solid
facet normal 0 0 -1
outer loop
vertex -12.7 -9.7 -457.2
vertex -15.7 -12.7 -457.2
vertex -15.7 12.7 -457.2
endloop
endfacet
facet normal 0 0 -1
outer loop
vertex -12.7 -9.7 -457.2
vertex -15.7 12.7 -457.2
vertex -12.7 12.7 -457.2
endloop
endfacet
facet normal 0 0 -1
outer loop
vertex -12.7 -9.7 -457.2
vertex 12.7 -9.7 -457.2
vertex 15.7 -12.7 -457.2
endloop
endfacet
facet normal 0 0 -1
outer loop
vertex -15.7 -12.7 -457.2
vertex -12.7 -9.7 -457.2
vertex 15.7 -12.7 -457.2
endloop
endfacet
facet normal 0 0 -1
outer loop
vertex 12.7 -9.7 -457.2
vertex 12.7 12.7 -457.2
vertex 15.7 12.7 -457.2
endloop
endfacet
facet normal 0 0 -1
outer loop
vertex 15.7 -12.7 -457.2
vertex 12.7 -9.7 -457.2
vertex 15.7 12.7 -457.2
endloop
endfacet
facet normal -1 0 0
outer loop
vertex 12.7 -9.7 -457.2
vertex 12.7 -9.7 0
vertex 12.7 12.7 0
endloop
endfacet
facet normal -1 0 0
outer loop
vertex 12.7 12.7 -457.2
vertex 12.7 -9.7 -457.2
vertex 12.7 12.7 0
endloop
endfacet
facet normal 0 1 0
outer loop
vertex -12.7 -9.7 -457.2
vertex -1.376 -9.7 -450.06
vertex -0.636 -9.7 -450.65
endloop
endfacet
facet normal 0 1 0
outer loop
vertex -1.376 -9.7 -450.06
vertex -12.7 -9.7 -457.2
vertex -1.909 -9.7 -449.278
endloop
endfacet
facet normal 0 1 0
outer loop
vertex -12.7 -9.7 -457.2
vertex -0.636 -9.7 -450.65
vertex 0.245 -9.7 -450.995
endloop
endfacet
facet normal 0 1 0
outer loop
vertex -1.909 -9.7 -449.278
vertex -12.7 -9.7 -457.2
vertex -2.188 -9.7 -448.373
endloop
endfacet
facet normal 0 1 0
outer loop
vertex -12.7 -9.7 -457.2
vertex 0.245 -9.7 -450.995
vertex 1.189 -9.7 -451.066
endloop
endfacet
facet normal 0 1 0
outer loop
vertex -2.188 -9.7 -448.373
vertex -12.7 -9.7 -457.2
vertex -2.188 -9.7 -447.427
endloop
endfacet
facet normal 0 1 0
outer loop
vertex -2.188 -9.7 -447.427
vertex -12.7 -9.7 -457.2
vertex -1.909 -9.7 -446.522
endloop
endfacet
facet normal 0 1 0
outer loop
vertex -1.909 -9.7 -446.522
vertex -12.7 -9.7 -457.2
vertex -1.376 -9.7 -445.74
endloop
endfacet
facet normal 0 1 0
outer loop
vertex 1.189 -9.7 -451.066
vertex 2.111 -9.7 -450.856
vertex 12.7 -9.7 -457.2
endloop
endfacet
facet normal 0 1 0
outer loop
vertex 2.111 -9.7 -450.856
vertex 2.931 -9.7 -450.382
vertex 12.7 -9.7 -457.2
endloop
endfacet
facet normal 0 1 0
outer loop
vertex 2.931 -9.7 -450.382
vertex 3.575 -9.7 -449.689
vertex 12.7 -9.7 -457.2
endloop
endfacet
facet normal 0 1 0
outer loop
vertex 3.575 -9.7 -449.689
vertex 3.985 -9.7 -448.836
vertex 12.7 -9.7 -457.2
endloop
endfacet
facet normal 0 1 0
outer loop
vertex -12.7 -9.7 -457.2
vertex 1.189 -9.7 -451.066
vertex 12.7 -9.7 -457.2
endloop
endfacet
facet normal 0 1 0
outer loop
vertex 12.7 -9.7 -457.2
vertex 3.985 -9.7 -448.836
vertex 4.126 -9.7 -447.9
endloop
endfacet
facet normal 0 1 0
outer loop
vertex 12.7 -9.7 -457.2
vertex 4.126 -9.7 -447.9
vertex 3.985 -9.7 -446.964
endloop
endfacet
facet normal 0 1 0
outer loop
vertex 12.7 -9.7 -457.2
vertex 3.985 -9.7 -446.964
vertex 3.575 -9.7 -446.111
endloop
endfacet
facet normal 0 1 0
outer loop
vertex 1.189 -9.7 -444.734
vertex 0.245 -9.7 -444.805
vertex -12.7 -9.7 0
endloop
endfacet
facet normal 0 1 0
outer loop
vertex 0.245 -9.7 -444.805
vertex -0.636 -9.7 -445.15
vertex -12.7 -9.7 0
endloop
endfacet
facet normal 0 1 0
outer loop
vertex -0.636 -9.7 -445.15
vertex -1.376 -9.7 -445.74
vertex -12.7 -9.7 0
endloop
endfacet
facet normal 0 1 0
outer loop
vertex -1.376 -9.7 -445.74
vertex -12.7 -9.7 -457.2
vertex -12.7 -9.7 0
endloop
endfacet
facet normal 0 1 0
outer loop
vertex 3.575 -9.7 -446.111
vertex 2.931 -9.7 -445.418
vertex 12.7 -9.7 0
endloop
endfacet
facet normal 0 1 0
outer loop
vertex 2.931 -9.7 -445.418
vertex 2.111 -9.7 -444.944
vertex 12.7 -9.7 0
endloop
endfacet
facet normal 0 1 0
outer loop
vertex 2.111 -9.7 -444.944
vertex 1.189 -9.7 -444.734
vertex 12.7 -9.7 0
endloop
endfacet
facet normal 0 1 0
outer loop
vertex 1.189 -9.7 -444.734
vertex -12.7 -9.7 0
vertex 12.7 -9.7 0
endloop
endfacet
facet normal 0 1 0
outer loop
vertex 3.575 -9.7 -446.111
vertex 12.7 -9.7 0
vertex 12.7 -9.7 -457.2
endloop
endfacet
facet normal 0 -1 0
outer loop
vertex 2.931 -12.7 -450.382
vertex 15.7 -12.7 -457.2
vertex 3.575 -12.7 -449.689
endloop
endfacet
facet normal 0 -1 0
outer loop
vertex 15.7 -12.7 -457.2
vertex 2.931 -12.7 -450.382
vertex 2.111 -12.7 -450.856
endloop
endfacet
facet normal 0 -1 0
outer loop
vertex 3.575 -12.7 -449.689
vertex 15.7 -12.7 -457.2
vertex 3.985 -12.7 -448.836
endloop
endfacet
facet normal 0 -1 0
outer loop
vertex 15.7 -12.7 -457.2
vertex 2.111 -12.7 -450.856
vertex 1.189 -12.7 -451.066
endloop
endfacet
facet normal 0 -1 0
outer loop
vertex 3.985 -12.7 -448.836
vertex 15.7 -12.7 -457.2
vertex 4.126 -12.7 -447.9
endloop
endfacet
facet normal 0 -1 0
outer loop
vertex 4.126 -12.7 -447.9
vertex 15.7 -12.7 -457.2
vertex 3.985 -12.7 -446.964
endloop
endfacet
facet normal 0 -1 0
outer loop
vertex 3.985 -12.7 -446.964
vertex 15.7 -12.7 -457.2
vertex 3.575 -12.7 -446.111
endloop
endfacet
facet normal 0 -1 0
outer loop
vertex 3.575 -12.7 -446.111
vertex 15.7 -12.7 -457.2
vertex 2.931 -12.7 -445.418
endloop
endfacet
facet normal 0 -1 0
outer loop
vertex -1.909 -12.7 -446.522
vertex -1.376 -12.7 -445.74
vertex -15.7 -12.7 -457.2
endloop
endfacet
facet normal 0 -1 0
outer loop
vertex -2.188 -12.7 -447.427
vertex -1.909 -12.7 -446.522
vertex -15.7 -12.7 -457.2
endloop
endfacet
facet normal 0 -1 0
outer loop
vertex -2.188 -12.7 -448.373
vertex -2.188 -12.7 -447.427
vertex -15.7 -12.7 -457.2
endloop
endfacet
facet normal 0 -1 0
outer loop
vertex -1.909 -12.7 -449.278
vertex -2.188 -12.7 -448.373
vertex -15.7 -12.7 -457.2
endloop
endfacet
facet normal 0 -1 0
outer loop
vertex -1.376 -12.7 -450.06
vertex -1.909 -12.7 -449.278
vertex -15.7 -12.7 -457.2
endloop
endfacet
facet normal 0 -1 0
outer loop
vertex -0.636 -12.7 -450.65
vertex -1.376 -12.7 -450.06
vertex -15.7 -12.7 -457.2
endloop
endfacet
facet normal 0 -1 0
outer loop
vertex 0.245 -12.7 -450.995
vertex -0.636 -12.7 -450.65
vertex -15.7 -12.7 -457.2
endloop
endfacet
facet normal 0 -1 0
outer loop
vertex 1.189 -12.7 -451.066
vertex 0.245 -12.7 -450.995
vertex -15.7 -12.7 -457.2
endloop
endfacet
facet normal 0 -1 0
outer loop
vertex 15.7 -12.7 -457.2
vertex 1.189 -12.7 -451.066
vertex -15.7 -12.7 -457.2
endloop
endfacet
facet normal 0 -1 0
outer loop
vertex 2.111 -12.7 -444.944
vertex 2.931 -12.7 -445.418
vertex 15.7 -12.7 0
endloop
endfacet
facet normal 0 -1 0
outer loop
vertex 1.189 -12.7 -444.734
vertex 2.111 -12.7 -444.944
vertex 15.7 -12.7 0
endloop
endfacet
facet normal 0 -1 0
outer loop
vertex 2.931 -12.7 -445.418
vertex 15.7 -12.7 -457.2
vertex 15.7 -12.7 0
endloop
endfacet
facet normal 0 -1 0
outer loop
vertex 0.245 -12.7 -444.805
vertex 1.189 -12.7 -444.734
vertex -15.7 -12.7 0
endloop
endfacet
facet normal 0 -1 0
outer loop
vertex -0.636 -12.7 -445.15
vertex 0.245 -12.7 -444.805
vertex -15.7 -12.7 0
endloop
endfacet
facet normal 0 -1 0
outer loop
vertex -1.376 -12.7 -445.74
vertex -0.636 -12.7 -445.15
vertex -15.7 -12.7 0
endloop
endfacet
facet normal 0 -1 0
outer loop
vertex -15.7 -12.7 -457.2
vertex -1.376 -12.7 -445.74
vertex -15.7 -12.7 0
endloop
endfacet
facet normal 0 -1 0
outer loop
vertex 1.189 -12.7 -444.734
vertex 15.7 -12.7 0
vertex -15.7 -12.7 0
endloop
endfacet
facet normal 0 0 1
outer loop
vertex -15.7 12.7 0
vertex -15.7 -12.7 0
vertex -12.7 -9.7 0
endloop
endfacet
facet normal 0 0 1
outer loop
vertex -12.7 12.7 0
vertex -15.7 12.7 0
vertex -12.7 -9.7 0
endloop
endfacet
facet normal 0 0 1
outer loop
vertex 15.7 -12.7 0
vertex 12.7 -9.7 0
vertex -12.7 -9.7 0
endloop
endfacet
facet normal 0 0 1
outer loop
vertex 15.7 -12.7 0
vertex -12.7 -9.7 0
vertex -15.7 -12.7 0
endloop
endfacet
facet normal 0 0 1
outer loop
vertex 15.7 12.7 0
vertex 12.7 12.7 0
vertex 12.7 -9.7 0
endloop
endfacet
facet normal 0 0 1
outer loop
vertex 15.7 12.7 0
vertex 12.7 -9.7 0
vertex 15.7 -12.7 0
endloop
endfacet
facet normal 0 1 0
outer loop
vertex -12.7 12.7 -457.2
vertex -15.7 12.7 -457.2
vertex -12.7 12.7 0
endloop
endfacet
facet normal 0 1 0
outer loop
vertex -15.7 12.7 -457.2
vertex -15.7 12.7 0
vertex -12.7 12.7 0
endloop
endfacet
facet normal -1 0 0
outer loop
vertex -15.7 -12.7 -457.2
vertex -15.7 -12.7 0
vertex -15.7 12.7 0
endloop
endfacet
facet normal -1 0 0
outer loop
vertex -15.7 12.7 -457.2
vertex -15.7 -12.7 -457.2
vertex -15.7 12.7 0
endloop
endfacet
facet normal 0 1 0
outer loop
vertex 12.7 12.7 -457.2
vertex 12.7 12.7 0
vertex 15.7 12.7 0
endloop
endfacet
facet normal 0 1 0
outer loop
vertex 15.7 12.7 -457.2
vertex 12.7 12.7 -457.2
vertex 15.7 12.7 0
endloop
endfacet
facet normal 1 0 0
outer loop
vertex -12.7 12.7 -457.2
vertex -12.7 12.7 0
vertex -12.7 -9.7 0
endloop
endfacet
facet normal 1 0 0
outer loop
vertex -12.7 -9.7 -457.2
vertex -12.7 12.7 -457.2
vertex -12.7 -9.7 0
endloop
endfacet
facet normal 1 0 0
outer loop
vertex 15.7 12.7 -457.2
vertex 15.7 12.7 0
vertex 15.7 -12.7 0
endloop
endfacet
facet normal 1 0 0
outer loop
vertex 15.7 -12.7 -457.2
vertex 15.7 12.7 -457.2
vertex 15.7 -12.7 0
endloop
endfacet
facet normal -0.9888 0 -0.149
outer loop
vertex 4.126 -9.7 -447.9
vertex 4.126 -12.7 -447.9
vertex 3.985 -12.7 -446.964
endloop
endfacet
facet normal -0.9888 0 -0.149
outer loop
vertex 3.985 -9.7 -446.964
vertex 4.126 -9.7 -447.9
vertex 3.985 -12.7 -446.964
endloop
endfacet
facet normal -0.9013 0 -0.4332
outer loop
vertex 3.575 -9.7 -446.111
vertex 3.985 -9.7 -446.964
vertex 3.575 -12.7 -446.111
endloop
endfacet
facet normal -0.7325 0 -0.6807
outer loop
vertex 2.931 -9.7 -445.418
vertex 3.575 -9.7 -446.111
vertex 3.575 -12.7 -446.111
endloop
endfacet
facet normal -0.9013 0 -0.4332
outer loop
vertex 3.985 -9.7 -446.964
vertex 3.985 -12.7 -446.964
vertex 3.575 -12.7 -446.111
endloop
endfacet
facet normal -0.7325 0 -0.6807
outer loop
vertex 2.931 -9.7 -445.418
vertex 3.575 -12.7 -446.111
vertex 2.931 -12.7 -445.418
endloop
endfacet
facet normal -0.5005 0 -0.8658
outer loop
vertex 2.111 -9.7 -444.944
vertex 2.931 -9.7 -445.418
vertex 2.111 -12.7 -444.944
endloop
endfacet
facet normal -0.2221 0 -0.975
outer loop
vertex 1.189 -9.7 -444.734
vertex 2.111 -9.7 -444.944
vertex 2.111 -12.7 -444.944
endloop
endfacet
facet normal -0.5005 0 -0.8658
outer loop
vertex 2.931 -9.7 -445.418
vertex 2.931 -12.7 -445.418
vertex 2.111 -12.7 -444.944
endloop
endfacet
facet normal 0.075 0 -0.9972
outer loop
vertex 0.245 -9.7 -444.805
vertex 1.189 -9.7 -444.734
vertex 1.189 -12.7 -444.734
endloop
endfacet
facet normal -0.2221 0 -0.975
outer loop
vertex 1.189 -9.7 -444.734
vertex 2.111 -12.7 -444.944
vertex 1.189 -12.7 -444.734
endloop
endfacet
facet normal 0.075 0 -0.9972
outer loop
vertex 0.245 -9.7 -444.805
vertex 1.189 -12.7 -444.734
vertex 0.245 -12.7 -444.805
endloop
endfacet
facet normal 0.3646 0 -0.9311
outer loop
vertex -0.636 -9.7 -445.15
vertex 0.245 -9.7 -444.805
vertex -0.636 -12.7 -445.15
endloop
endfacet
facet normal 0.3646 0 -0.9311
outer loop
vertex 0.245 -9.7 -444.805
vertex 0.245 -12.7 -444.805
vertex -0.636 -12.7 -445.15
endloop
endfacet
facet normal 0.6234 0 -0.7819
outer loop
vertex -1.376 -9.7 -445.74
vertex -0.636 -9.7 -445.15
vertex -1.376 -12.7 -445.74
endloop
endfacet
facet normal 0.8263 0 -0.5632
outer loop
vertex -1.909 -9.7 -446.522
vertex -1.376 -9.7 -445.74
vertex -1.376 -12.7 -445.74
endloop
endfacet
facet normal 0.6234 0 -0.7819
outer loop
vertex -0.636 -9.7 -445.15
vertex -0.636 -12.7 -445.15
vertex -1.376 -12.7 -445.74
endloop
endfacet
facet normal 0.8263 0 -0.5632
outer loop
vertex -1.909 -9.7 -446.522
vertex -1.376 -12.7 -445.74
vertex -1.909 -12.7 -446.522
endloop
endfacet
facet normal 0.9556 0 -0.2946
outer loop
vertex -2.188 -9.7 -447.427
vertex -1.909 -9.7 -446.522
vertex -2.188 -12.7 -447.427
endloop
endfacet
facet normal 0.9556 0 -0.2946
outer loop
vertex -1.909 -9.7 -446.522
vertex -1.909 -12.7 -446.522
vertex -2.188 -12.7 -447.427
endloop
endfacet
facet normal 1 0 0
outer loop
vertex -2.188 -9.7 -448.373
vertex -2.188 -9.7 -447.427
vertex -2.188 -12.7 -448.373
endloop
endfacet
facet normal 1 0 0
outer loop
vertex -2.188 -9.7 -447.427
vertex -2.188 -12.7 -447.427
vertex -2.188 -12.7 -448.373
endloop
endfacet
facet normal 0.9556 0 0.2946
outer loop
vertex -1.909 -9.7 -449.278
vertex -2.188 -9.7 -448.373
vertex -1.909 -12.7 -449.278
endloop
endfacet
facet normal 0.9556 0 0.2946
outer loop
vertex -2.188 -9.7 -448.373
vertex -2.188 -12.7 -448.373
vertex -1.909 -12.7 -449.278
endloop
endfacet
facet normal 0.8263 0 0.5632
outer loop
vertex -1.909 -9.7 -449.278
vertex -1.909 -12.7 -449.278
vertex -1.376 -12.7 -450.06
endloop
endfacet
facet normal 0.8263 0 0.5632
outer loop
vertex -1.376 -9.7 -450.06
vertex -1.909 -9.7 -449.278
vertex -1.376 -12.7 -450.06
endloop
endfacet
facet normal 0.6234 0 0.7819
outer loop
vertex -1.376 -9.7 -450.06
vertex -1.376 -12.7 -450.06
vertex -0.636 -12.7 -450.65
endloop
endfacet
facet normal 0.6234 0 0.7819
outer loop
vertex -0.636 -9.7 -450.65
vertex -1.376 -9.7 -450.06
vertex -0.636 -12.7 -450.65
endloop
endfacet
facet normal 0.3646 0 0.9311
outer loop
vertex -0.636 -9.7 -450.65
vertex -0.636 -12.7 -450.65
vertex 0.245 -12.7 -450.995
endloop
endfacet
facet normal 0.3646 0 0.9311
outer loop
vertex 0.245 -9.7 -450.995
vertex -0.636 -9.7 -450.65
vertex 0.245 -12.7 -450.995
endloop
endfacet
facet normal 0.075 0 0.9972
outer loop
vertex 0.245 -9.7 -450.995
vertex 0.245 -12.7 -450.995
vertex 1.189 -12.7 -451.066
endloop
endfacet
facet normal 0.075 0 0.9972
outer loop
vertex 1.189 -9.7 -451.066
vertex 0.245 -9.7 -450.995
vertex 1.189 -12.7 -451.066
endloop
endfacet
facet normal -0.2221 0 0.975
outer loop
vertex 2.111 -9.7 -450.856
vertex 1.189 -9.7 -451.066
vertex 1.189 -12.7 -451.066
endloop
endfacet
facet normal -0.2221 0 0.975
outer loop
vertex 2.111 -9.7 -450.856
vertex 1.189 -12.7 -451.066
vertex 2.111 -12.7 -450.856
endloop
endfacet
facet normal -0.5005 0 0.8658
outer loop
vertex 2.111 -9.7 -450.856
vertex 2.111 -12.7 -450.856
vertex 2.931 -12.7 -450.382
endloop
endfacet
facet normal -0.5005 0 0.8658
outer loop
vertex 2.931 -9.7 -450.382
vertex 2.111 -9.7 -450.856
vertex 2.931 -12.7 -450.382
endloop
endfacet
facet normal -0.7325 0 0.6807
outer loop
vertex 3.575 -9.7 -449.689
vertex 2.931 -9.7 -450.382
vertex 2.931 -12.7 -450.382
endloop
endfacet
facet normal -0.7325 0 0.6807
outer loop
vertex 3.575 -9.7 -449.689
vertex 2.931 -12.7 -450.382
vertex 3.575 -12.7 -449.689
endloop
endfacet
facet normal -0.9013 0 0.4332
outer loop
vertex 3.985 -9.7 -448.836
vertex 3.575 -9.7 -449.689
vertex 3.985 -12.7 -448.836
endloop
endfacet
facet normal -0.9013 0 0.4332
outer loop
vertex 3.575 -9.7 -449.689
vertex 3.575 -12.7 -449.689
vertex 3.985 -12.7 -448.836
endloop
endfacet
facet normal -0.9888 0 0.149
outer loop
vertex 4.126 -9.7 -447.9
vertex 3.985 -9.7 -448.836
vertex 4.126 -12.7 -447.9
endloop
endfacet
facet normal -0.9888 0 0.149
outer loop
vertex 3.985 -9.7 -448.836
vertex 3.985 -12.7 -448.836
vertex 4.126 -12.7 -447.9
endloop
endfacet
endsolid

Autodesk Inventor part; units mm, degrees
ref_plane "YZ Plane" through (0, 0, 0) normal (1, 0, 0) x (0, 1, 0)
ref_plane "XZ Plane" through (0, 0, 0) normal (0, 1, 0) x (-1, 0, 0)
ref_plane "XY Plane" through (0, 0, 0) normal (0, 0, 1) x (1, 0, 0)
sketch "Sketch1" plane through (0, 0, 0) normal (0, 0, 1) x (1, 0, 0)
  line L0 (-15.7, 12.7) -> (-12.7, 12.7)
  line L1 (-12.7, 12.7) -> (-12.7, -9.7)
  line L2 (-12.7, -9.7) -> (12.7, -9.7)
  line L3 (12.7, -9.7) -> (12.7, 12.7)
  line L4 (12.7, 12.7) -> (15.7, 12.7)
  line L5 (15.7, 12.7) -> (15.7, -12.7)
  line L6 (15.7, -12.7) -> (-15.7, -12.7)
  line L7 (-15.7, -12.7) -> (-15.7, 12.7)
  point P0 (0, 0)
  dimension "d0" = 3
  dimension "d2" = 3
  dimension "d3" = 25.4
  dimension "d4" = 31.4
  dimension "d5" = 15.7
  dimension "d7" = 12.7
  dimension "d8" = 3
extrude "Extrusion1" add sketch "Sketch1" against normal blind 457.2
sketch "Sketch6" plane through (-15.7, -12.7, 0) normal (0, -1, 0) x (1, 0, 0)
  circle A0 centre (16.6513, -447.9) radius 3.175
  point P0 (15.7, 0)
  dimension "d21" = 6.35
extrude "Extrusion4" cut sketch "Sketch6" against normal blind 10
equation "\"d2\" = d0"
equation "\"d5\" = 0.5 * d4"
equation "\"d7\" = 0.5 * d3"
equation "\"d8\" = d0"
properties part number "18in C-Channel"
